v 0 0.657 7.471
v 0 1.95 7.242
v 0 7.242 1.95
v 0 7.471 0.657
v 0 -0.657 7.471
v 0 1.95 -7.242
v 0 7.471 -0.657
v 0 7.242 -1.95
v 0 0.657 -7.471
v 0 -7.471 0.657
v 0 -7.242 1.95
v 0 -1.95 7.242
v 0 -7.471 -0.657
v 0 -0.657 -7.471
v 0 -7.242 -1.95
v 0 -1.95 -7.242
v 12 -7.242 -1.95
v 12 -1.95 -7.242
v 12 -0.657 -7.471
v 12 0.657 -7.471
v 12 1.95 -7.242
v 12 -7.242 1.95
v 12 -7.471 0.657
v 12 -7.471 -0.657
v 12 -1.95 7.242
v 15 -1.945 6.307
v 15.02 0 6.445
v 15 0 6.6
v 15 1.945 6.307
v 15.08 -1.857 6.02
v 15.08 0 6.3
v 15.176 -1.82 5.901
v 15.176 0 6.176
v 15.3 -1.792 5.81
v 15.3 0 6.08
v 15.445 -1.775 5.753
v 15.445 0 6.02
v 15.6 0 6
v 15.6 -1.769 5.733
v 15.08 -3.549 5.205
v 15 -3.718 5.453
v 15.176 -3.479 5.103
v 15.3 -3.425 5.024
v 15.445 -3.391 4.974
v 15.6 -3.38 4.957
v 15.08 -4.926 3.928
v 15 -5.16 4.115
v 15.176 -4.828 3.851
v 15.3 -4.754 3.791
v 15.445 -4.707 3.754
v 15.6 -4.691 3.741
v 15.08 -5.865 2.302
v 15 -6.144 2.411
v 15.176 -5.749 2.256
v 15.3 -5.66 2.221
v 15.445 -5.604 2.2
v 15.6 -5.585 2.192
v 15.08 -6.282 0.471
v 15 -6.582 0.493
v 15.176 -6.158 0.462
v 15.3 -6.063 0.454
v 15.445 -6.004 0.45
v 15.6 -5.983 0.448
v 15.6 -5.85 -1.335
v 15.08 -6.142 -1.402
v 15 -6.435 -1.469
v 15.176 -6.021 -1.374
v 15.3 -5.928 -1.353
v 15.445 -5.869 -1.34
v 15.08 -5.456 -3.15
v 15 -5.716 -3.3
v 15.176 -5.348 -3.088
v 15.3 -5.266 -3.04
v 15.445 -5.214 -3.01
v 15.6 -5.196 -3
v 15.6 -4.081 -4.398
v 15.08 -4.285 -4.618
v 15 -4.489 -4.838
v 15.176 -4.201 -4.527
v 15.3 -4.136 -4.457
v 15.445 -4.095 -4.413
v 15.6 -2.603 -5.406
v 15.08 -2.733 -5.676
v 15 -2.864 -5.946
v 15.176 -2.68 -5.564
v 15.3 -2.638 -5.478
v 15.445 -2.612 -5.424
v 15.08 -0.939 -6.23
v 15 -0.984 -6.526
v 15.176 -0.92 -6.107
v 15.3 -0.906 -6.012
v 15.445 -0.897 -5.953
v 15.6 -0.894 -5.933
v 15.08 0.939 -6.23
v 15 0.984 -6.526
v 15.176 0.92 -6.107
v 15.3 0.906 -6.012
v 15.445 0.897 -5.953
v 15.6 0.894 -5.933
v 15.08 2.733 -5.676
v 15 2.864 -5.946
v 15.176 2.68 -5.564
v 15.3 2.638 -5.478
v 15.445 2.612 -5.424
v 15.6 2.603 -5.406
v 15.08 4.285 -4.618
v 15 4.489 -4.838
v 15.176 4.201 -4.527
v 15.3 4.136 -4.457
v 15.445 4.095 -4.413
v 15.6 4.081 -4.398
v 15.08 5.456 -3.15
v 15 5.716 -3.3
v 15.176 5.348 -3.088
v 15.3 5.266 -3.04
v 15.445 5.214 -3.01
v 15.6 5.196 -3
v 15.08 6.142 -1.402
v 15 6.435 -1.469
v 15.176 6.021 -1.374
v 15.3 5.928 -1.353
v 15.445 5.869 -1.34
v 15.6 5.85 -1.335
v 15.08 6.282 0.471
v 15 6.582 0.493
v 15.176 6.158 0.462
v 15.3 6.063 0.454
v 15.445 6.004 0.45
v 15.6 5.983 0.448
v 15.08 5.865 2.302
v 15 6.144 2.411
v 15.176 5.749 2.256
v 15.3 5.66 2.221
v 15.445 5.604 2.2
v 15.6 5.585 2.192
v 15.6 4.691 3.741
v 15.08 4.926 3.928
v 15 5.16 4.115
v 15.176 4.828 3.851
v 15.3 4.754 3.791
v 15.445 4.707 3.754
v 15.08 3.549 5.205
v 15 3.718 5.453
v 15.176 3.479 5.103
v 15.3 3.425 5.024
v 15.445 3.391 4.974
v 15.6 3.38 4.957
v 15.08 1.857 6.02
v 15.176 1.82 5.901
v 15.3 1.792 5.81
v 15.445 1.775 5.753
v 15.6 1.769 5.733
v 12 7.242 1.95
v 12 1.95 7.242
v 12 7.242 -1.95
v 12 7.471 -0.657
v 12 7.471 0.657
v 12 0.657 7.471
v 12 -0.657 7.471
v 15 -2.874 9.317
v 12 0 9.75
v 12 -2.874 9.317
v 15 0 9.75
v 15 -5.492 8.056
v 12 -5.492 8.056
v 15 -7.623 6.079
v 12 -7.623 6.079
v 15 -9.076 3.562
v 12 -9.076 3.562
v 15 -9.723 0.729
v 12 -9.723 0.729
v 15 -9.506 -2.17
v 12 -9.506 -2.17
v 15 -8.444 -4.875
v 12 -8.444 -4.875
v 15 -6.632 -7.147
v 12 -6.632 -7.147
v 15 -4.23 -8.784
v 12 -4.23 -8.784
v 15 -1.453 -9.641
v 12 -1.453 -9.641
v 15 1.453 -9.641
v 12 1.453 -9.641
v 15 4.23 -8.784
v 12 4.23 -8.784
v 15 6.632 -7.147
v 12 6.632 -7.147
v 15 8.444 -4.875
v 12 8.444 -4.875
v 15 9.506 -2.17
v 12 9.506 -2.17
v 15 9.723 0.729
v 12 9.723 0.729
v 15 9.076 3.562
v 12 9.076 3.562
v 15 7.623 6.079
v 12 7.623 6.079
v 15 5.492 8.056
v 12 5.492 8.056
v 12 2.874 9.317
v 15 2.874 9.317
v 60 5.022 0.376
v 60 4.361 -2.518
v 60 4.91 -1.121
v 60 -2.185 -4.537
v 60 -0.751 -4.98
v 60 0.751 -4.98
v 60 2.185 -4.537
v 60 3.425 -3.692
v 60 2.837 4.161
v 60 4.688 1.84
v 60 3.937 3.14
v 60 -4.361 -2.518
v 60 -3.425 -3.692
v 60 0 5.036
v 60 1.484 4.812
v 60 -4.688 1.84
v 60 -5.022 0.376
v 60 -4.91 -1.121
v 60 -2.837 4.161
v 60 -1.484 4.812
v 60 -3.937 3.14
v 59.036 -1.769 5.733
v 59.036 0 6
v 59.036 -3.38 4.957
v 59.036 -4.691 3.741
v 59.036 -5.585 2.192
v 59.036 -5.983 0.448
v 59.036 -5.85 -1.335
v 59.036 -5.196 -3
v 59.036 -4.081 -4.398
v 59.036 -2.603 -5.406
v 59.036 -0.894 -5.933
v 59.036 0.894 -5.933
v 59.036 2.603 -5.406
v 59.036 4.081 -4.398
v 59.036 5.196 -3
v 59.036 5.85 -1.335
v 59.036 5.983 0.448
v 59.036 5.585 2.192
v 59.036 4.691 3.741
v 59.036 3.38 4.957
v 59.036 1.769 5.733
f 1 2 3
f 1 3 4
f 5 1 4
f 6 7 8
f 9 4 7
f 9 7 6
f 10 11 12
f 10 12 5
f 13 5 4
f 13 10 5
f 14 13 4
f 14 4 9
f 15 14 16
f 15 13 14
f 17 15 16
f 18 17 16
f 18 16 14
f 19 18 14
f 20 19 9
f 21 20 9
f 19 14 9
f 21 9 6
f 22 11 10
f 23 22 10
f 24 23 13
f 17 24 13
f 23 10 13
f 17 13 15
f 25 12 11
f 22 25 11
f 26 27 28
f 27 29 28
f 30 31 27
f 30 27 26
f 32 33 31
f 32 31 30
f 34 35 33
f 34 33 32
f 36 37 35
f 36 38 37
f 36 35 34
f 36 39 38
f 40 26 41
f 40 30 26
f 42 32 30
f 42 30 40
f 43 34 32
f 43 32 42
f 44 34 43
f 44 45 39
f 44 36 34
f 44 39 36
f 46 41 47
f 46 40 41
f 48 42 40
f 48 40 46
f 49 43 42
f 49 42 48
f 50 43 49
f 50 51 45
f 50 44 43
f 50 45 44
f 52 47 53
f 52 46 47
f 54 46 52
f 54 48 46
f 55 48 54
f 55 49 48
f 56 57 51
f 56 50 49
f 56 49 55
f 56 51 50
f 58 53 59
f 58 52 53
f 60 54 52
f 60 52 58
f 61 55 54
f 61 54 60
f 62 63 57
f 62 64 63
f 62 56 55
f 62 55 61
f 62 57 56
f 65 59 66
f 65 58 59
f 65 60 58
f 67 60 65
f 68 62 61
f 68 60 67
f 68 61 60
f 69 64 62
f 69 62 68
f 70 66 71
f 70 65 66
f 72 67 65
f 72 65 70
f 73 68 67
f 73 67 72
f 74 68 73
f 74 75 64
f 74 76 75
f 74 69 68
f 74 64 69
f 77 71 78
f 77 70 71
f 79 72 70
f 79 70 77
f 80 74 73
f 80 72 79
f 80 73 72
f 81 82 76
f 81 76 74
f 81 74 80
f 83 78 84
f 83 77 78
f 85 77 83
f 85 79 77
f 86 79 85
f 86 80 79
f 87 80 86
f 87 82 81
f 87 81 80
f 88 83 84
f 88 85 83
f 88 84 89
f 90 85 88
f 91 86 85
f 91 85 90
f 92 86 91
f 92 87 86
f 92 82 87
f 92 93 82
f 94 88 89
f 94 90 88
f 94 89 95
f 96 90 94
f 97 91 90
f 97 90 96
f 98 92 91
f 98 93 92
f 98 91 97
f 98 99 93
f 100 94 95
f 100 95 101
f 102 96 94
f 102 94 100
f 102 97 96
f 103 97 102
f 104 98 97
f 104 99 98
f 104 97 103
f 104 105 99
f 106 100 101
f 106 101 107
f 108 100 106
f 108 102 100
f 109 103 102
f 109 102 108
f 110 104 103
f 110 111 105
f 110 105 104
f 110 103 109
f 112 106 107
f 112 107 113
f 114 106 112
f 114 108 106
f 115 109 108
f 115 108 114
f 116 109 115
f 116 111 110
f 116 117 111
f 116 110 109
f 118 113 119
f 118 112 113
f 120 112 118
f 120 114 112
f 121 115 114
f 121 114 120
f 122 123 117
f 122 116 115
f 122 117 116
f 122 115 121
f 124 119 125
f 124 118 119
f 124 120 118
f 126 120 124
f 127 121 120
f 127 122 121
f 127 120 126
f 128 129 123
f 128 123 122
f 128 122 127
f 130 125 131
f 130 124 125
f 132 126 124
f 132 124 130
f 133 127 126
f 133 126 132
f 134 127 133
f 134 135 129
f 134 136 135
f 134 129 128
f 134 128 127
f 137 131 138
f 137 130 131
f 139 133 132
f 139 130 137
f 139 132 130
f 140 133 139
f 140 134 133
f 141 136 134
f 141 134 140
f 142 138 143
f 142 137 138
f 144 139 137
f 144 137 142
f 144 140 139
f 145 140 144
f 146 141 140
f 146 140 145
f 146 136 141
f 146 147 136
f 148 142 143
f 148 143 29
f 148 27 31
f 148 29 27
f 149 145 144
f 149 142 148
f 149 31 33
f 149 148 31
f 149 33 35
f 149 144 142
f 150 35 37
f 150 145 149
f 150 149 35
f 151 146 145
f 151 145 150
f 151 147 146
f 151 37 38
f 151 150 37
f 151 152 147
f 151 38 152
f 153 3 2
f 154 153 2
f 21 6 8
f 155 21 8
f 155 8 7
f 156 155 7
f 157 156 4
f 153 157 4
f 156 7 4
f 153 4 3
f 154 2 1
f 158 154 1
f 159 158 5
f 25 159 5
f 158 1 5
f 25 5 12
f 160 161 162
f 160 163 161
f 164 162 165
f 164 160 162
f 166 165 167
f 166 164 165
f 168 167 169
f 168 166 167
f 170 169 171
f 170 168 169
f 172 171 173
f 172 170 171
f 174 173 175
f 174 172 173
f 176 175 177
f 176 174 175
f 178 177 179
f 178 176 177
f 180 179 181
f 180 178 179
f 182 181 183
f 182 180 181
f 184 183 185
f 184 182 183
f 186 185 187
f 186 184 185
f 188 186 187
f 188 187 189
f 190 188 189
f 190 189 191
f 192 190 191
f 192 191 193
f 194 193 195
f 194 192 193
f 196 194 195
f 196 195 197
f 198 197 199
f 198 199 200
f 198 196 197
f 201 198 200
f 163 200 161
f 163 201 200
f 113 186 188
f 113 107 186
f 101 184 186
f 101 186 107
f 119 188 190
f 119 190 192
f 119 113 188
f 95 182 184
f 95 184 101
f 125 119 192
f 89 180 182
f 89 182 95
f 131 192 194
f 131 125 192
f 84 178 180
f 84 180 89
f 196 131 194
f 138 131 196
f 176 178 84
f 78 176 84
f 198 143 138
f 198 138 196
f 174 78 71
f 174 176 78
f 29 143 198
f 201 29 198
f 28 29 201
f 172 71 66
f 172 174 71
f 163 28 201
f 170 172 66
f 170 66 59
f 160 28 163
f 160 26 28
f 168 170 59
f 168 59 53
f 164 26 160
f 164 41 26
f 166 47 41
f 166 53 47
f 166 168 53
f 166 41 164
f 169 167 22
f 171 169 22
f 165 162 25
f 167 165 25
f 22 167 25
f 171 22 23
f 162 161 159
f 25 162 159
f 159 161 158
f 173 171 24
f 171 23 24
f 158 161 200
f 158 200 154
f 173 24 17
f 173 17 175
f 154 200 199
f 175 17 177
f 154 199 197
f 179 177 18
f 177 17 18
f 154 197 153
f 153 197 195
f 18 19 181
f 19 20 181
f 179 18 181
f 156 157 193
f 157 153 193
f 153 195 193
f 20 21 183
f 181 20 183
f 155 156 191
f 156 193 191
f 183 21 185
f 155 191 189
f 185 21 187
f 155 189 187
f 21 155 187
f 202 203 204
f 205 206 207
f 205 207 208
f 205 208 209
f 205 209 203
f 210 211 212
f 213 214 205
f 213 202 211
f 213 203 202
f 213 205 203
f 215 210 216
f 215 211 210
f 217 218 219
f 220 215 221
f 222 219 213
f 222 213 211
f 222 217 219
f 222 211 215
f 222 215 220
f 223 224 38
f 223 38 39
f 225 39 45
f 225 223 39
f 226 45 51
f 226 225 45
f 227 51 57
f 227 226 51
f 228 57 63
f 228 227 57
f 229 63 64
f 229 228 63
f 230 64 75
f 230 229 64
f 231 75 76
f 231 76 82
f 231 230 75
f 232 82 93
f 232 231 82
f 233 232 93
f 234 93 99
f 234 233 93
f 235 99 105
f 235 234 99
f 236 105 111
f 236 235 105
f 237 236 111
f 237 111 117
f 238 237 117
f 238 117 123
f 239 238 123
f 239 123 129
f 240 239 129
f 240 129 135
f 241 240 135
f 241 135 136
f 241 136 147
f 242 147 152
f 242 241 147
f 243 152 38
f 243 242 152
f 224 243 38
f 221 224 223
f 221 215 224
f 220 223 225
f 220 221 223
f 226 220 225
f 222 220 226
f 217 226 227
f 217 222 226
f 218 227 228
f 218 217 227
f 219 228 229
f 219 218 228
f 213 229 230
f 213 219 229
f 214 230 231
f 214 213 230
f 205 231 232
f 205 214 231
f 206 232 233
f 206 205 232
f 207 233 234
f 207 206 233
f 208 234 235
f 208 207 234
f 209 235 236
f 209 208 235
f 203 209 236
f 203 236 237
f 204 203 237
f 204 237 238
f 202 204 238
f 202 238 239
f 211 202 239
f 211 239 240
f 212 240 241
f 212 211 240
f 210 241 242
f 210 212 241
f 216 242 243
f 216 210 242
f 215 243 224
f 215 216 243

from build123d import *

# Parameters (mm, degrees)
FILLET1_R           = 0.6
FILLET2_R           = 0.6
SQRDRVSKE_OUTSIDE_W = 34.706
SQRDRVSKE_OUTSIDE_H = 34.706
SQUARE_DRIVE_DEPTH  = 12


with BuildPart() as part:
    # BodySke → Base-Revolve (revolve)
    with BuildSketch(Plane.XY, mode=Mode.PRIVATE) as base_revolve_sk:
        Polygon((0, 0), (0, 9.75), (15, 9.75), (15, 6), (59.036, 6), (60, 5.036), (60, 0), align=None)
    revolve(base_revolve_sk.sketch.rotate(Axis((-31.75, 0, 0), (1, 0, 0)), 90), axis=Axis((-31.75, 0, 0), (1, 0, 0)))

    # Fillet1
    fillet1_edges = [part.edges().sort_by_distance(p)[0] for p in [
        (15, 0, -6),
    ]]
    fillet(fillet1_edges, radius=FILLET1_R)

    # Fillet2
    fillet2_edges = [part.edges().sort_by_distance(p)[0] for p in [
        (0, 0, -9.75),
    ]]
    fillet(fillet2_edges, radius=FILLET2_R)

    # SqrDrvSke outside → Square drive (cut)
    with BuildSketch(Plane(origin=(0, 0, 0), x_dir=(0, 0, -1), z_dir=(1, 0, 0))):
        Rectangle(SQRDRVSKE_OUTSIDE_W, SQRDRVSKE_OUTSIDE_H)
        with BuildLine():
            Line((1.950442767, -7.241945389), (7.241945389, -1.950442767))
            ThreePointArc((7.241945389, -1.950442767), (7.5, 0), (7.241945389, 1.950442767))
            Line((7.241945389, 1.950442767), (1.950442767, 7.241945389))
            ThreePointArc((1.950442767, 7.241945389), (0, 7.5), (-1.950442767, 7.241945389))
            Line((-1.950442767, 7.241945389), (-7.241945389, 1.950442767))
            ThreePointArc((-7.241945389, 1.950442767), (-7.5, 0), (-7.241945389, -1.950442767))
            Line((-7.241945389, -1.950442767), (-1.950442767, -7.241945389))
            ThreePointArc((-1.950442767, -7.241945389), (0, -7.5), (1.950442767, -7.241945389))
        make_face(mode=Mode.SUBTRACT)
    extrude(amount=SQUARE_DRIVE_DEPTH, mode=Mode.SUBTRACT)


solid = part.part
